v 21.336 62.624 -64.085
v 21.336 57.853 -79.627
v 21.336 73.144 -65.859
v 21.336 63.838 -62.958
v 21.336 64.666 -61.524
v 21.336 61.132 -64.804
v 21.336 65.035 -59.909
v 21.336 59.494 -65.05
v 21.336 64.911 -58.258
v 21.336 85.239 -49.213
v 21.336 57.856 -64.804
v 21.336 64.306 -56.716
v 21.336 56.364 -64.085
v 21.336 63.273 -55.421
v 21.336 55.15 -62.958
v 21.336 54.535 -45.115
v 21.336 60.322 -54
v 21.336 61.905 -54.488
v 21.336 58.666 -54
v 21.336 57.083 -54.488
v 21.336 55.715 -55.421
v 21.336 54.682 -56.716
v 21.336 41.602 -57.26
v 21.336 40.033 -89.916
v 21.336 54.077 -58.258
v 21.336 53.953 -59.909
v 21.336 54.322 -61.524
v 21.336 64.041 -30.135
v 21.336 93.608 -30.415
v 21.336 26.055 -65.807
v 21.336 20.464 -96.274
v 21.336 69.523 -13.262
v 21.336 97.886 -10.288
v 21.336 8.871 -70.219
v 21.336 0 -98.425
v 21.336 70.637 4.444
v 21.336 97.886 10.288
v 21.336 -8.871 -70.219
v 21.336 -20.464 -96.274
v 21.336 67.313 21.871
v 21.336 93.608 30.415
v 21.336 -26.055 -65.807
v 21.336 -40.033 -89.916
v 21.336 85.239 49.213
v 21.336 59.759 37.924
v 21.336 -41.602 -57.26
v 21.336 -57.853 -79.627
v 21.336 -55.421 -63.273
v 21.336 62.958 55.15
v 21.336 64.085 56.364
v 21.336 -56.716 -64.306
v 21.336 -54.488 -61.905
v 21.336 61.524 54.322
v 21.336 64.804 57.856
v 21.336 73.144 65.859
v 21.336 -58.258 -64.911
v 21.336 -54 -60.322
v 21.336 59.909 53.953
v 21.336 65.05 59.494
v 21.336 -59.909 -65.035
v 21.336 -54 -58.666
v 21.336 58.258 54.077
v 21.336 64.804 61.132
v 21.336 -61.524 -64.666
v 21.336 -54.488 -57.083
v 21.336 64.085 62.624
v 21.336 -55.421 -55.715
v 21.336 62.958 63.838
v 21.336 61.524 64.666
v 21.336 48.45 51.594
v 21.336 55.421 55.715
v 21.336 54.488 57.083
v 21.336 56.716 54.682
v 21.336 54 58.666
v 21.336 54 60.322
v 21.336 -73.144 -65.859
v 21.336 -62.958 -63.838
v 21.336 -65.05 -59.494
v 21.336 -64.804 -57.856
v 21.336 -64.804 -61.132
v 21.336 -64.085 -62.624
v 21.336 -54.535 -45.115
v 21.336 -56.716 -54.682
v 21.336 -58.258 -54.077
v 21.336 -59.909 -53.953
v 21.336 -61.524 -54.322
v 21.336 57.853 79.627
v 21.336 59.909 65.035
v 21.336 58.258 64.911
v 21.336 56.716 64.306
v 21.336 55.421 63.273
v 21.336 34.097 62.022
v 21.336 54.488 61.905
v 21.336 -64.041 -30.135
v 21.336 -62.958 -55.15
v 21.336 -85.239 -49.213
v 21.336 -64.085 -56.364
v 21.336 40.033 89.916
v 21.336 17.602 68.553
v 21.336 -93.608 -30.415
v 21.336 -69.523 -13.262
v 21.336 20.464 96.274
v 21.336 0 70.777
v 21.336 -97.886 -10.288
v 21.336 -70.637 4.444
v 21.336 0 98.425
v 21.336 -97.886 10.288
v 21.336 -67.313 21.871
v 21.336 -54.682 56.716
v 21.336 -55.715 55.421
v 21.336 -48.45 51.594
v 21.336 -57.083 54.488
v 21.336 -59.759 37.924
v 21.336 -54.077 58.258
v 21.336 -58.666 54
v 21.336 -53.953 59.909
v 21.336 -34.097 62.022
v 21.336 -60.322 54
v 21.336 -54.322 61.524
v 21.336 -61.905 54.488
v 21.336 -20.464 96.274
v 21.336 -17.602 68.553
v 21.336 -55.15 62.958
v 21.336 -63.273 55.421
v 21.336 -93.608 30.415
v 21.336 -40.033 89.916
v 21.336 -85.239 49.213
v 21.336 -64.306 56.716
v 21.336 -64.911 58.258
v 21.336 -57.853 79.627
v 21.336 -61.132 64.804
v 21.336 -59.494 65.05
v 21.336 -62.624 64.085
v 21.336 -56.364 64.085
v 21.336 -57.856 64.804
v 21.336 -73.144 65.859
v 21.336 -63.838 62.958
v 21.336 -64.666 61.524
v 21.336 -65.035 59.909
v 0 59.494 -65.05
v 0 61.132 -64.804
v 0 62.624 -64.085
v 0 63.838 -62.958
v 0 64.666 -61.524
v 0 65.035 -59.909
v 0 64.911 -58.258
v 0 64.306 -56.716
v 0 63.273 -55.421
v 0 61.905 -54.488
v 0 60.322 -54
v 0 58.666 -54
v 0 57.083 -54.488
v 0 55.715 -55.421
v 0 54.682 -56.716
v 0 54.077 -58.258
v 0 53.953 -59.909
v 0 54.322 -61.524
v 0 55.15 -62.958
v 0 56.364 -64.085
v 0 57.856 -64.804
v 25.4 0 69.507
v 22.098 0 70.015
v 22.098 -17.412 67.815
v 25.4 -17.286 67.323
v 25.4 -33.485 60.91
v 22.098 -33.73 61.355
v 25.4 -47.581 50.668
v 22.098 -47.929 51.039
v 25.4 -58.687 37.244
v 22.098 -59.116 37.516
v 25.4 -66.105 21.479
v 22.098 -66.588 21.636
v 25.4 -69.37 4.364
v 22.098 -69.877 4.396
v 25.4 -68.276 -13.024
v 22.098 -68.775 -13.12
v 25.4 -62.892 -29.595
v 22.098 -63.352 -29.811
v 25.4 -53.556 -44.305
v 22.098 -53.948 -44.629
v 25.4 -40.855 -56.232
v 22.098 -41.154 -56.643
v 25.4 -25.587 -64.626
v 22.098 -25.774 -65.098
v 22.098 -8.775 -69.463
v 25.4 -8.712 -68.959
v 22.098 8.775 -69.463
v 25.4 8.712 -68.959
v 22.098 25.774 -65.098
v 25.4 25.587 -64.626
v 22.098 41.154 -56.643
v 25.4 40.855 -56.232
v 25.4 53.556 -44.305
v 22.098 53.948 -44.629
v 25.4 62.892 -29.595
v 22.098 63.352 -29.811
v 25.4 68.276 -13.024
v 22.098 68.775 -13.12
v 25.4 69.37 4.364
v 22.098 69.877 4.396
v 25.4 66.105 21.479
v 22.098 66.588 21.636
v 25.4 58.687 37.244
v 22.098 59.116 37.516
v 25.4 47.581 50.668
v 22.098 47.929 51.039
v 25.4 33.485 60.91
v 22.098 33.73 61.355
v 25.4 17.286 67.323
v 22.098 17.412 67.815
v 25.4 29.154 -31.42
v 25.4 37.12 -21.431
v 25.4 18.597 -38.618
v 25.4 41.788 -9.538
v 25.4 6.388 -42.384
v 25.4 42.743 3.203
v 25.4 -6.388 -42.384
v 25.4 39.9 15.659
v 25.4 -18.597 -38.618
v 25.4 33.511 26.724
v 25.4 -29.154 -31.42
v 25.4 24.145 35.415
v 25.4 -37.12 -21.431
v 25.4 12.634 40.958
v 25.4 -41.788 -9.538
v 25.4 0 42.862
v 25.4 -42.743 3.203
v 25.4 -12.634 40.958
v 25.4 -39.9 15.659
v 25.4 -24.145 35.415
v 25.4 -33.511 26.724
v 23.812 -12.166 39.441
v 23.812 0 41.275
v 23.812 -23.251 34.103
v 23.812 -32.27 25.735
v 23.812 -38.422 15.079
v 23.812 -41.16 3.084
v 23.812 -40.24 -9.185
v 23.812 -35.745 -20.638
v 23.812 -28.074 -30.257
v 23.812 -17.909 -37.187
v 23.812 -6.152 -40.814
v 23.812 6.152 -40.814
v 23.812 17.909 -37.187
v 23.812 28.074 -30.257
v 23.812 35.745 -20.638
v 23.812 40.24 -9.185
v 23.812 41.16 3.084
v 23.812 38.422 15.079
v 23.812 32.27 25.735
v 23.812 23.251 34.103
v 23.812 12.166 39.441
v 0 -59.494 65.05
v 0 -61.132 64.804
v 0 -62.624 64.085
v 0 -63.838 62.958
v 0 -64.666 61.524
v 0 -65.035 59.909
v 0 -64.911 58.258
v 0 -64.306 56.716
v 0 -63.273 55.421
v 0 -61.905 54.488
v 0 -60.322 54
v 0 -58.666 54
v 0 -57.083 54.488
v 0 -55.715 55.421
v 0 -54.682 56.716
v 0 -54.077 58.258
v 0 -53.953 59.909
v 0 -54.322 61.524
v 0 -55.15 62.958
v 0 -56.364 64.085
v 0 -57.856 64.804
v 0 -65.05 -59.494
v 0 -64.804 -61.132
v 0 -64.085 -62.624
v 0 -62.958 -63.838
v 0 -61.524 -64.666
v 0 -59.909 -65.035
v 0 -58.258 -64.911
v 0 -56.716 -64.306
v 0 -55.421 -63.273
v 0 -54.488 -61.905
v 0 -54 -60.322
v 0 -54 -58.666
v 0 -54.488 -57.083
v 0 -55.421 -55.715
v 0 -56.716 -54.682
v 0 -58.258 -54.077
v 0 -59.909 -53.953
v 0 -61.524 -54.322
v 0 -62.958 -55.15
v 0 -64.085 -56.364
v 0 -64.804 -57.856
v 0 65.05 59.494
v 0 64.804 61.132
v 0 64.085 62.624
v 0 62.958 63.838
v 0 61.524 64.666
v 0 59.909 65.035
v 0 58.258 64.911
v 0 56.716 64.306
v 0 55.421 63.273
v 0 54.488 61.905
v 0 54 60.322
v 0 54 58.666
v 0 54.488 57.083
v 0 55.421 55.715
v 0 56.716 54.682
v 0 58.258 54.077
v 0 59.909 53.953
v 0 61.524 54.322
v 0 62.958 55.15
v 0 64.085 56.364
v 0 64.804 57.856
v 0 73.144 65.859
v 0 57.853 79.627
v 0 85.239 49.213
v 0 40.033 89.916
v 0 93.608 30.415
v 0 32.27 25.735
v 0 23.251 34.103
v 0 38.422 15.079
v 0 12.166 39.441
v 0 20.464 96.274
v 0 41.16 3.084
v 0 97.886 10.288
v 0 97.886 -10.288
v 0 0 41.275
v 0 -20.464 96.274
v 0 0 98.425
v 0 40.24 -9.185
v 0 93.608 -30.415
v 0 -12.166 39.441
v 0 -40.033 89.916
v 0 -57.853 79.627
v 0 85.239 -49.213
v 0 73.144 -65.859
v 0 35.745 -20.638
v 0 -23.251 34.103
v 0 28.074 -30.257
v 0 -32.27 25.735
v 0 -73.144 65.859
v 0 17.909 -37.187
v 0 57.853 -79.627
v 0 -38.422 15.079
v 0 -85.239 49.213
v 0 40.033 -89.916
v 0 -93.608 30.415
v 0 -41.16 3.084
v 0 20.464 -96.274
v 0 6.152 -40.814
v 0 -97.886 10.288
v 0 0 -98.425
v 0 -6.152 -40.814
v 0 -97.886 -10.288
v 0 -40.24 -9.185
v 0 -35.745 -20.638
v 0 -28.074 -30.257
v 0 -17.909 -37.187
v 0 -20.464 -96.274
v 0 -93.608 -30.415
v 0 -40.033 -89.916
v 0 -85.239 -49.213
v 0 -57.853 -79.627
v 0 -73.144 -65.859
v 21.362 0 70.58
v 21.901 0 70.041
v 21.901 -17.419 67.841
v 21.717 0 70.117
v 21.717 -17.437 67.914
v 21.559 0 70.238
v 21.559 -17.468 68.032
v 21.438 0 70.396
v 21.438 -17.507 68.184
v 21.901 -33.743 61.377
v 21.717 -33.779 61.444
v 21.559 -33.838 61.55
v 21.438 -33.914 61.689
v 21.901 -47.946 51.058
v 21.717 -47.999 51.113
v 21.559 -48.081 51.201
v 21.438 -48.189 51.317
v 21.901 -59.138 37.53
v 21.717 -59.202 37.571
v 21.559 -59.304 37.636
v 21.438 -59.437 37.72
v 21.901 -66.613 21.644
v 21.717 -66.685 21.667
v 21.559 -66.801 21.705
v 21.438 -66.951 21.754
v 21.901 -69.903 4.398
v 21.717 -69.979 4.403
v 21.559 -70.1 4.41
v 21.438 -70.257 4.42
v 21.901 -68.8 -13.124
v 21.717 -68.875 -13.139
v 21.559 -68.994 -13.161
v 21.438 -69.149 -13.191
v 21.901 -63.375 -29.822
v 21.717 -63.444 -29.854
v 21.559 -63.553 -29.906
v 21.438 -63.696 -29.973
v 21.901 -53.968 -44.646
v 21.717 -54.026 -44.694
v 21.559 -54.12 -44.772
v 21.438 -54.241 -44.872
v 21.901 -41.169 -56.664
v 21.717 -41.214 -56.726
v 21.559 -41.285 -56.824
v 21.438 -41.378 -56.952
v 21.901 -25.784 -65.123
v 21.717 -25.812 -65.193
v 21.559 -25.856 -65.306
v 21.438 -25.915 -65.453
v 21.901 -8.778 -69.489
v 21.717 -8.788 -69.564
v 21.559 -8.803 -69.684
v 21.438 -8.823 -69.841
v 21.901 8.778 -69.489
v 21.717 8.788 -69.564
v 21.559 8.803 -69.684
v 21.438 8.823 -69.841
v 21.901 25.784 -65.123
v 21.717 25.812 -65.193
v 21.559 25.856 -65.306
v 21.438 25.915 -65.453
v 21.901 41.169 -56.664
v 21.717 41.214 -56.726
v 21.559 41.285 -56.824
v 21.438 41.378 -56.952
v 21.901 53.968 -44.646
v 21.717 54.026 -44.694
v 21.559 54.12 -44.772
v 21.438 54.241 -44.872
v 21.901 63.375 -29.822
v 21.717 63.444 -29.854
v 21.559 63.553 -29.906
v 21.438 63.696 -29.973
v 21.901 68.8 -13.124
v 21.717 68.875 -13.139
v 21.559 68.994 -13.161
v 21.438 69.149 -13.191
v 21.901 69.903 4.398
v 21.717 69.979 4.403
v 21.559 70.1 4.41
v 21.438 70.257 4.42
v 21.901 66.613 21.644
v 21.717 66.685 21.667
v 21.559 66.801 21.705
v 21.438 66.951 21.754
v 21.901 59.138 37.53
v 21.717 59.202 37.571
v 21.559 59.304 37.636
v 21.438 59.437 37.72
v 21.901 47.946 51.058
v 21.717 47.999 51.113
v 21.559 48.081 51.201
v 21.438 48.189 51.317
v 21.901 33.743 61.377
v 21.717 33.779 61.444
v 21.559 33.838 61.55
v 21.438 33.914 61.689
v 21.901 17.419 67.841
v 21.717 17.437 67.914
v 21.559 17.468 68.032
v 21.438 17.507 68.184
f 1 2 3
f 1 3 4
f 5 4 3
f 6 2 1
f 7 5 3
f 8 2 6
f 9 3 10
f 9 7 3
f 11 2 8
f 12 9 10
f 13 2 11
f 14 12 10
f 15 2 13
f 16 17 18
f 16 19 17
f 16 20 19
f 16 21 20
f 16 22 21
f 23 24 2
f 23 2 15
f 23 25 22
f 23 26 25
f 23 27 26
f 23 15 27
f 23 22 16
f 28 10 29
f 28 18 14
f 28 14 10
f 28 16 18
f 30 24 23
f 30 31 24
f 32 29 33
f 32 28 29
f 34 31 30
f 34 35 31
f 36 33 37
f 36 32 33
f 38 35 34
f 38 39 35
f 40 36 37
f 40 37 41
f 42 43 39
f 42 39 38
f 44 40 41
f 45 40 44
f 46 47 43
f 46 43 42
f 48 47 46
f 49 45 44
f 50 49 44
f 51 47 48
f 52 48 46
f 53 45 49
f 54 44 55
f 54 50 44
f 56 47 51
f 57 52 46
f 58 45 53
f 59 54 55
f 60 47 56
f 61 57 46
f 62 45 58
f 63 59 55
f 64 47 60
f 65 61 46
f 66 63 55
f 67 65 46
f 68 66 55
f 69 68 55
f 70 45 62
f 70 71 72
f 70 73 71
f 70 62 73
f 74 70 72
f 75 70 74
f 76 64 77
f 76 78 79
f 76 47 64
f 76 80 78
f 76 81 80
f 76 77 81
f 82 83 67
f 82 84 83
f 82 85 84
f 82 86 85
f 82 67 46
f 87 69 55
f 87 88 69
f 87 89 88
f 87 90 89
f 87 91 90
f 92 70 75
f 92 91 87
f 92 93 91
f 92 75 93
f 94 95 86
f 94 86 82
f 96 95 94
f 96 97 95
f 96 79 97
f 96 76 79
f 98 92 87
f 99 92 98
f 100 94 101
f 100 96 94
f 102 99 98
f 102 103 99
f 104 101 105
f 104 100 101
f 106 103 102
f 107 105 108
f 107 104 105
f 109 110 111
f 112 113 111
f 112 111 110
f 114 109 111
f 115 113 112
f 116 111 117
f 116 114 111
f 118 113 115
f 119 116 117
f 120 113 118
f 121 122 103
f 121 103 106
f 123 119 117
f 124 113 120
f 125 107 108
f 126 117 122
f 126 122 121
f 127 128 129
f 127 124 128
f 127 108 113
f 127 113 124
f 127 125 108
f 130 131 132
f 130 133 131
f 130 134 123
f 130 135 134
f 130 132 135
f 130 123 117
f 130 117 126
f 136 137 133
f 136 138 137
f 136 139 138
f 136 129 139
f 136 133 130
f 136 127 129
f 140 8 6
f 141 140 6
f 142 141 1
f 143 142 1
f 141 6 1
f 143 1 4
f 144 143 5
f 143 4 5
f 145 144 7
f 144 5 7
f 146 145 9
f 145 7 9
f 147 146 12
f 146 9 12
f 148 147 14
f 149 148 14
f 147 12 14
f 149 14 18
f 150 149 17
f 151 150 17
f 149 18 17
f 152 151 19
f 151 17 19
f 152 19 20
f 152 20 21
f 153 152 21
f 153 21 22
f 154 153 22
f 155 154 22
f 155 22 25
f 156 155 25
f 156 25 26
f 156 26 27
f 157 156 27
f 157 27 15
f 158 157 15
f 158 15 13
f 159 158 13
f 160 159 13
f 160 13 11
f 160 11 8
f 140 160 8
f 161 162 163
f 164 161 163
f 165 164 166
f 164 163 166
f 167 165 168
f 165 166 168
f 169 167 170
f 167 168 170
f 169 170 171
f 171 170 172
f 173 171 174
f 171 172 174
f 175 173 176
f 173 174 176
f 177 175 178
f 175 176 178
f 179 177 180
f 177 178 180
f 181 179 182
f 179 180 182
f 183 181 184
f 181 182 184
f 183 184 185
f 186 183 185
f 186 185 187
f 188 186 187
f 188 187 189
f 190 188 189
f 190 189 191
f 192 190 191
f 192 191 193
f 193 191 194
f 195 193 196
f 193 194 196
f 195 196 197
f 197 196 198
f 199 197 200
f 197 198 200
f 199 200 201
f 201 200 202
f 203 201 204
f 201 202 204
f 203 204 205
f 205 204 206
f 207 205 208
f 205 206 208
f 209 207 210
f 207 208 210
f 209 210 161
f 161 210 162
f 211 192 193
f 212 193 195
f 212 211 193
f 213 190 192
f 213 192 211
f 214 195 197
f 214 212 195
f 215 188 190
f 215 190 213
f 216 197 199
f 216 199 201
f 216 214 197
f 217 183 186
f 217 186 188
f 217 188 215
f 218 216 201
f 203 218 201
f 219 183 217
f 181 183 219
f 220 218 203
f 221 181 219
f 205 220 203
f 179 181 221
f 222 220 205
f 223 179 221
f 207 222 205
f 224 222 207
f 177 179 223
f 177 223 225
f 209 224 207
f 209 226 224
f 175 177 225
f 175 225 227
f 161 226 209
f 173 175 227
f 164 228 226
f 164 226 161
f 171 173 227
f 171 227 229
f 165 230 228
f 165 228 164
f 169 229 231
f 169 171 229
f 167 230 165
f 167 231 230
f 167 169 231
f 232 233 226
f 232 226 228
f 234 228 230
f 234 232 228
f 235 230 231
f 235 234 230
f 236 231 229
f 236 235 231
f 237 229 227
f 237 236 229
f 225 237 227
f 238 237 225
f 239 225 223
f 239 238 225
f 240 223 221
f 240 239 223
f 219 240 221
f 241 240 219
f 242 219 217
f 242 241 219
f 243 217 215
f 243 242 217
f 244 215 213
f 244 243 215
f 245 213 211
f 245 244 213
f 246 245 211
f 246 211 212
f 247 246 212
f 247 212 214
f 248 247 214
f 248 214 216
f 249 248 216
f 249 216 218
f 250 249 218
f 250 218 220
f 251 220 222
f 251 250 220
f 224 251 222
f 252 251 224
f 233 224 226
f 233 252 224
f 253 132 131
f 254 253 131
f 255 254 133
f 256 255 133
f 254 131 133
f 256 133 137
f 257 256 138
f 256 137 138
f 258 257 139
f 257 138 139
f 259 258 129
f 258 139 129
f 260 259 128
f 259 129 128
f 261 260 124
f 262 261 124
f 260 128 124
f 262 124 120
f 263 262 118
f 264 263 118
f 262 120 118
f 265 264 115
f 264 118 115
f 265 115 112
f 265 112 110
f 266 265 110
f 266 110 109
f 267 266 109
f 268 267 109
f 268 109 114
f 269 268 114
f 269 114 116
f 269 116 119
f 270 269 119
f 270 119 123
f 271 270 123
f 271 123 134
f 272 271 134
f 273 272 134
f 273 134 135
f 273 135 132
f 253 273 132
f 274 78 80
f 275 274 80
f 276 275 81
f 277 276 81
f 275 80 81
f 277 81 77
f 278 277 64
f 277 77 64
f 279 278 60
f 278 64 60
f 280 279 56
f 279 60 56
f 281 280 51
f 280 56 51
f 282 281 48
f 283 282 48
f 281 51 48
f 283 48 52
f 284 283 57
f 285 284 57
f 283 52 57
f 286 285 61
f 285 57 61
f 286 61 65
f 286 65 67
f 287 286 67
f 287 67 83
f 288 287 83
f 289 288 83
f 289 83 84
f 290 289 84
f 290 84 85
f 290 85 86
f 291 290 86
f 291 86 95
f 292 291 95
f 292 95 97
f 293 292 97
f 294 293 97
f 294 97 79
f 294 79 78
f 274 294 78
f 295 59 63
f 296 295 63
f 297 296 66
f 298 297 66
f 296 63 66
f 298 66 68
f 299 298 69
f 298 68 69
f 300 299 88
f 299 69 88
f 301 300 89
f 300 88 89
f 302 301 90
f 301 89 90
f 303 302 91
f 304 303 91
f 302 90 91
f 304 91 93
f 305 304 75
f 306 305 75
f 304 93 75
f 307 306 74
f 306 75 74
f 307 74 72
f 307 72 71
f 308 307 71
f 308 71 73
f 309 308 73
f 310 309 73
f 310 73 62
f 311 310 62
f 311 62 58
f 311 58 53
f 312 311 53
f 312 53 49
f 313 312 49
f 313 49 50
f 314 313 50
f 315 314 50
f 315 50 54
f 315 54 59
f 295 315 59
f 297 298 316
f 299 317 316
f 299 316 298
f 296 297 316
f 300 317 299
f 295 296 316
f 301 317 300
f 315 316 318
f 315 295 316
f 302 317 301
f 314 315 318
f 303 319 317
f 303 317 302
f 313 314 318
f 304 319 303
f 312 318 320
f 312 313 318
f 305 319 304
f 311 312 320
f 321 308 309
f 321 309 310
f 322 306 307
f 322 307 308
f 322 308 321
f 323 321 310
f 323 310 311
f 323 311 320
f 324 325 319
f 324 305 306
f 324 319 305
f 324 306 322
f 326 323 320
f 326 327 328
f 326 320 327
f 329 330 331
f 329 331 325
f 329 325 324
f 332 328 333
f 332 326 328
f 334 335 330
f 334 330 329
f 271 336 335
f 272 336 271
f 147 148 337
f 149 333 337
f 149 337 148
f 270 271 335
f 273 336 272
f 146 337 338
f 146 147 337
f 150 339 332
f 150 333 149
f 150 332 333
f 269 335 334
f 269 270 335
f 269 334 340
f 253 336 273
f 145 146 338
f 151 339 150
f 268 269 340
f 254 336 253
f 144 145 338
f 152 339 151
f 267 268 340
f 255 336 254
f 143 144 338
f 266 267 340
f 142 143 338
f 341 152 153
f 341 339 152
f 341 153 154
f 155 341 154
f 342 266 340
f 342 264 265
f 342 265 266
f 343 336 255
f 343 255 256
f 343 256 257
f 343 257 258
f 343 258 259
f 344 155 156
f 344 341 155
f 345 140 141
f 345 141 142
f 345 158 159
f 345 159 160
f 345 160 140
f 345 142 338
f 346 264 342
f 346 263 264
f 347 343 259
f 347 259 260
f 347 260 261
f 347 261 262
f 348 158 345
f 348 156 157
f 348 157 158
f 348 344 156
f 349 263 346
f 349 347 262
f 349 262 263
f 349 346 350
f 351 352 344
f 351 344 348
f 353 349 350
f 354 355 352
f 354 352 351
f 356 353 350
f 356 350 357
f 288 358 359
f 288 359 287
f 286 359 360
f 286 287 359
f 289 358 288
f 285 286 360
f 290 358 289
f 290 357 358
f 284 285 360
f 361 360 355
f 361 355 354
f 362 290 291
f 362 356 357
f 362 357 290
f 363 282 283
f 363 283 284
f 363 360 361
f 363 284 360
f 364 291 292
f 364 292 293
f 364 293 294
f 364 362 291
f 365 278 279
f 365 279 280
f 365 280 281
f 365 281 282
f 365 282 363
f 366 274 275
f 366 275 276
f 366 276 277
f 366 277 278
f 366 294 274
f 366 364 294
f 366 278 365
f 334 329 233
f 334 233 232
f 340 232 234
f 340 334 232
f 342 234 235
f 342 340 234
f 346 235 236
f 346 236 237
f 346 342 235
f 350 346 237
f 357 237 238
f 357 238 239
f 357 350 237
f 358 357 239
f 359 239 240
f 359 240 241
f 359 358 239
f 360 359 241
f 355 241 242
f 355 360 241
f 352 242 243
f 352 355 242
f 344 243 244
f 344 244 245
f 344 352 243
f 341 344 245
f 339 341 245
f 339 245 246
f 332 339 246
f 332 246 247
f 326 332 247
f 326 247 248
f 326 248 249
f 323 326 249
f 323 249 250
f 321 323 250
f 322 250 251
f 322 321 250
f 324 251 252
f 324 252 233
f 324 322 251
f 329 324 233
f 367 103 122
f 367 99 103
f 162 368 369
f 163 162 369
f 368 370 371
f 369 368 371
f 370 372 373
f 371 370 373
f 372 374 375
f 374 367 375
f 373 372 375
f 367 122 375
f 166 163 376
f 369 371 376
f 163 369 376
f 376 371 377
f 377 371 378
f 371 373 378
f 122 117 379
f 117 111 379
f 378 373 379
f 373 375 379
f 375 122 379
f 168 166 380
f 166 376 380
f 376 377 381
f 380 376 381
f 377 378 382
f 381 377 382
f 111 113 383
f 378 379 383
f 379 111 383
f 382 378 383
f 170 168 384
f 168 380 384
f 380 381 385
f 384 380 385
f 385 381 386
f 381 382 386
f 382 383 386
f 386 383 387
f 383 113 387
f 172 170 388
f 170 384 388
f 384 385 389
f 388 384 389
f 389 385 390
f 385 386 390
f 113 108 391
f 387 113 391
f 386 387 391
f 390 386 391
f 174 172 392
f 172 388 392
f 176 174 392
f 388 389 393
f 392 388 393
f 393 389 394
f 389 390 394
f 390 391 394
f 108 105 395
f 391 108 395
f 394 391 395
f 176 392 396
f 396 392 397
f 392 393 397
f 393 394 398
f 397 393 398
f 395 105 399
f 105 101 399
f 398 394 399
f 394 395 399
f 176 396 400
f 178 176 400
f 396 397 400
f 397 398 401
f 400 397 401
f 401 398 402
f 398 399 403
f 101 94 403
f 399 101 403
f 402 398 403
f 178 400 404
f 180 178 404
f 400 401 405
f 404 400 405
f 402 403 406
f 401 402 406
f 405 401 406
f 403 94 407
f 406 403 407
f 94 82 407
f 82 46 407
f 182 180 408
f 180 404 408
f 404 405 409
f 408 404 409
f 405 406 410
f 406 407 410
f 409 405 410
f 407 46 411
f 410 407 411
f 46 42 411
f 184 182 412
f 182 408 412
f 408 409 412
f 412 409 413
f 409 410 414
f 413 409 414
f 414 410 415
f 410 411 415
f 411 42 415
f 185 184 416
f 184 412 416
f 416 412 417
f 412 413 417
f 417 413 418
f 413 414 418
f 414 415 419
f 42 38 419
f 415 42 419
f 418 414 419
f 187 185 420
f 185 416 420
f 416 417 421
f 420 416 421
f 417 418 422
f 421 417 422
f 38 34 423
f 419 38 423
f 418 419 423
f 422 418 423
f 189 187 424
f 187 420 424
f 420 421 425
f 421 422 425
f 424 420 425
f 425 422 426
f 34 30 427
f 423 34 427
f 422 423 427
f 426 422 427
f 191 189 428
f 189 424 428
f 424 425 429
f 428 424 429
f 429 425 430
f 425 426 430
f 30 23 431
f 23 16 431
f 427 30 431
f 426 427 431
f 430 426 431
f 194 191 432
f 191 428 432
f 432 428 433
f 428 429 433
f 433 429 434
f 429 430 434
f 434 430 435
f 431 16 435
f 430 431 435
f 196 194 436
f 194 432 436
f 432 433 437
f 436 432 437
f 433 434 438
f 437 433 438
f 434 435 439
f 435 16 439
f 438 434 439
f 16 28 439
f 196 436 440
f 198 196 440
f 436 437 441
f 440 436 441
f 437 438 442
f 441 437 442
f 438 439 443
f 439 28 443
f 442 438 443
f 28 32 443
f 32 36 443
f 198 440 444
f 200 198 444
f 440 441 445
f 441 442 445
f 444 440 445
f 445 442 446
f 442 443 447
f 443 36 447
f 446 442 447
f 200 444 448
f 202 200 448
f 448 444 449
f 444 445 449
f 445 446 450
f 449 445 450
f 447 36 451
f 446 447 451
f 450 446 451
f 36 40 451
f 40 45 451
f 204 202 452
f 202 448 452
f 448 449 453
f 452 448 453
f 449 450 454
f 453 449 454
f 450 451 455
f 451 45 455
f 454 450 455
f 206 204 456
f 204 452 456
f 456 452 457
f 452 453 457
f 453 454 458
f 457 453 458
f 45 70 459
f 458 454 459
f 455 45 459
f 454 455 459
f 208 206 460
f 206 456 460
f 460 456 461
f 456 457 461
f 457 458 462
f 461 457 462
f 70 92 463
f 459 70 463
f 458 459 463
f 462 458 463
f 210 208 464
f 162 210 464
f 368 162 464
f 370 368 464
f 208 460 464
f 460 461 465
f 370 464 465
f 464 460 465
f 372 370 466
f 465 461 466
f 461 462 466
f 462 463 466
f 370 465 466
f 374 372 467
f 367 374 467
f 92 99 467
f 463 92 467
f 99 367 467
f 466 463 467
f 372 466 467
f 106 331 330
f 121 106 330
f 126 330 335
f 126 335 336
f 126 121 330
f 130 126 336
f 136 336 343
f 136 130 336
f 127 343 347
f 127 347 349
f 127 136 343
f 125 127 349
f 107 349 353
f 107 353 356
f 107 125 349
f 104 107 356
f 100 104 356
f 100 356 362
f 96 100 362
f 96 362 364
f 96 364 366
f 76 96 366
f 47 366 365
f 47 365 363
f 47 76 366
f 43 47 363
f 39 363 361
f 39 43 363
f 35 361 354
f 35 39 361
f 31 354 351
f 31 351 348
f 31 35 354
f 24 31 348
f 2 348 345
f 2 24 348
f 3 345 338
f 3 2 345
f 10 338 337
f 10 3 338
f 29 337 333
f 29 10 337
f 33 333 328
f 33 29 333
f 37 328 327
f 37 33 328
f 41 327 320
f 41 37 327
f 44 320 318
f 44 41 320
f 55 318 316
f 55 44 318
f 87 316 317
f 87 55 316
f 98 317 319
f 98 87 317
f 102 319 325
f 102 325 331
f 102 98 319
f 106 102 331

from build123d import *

# Parameters (mm, degrees)
SKETCH2_R          = 5.55625
CUT_EXTRUDE1_DEPTH = 141.819693743
CIRPATTERN1_COUNT  = 4
CHAMFER1_SIZE      = 0.508
CHAMFER1_SIZE2     = 3.302
CHAMFER2_SIZE      = 1.5875
FILLET1_R          = 0.762


with BuildPart() as part:
    # Sketch1 → Revolve1 (revolve)
    with BuildSketch(Plane.XY, mode=Mode.PRIVATE) as revolve1_sk:
        Polygon((0, 41.275), (0, 98.425), (21.336, 98.425), (21.336, 70.0151), (25.4, 70.0151), (25.4, 41.275), align=None)
    revolve(revolve1_sk.sketch.rotate(Axis((0, 0, 0), (1, 0, 0)), 90), axis=Axis((0, 0, 0), (1, 0, 0)))

    # Sketch2 → Cut-Extrude1 (cut, through all)
    with BuildSketch(Plane(origin=(21.336, 0, 0), x_dir=(0, 0, -1), z_dir=(1, 0, 0))):
        with Locations((59.494196802, 59.494196802)):
            Circle(SKETCH2_R)
    cut_extrude1 = extrude(amount=-CUT_EXTRUDE1_DEPTH, mode=Mode.SUBTRACT)

    # CirPattern1: Cut-Extrude1 ×4 about axis
    cirpattern1_axis = Axis((0, 0, 0), (1, 0, 0))
    for i in range(1, CIRPATTERN1_COUNT):
        add(cut_extrude1.rotate(cirpattern1_axis, i * 360 / CIRPATTERN1_COUNT), mode=Mode.SUBTRACT)

    # Chamfer1
    chamfer1_edges = [part.edges().sort_by_distance(p)[0] for p in [
        (25.4, 0, -70.0151),
    ]]
    chamfer1_side = [part.faces().sort_by_distance(p)[0] for p in [
        (25.4, 0, -68.03477392),
    ]]
    chamfer(chamfer1_edges, length=CHAMFER1_SIZE, length2=CHAMFER1_SIZE2, reference=chamfer1_side[0])

    # Chamfer2
    chamfer2_edges = [part.edges().sort_by_distance(p)[0] for p in [
        (25.4, 0, -41.275),
    ]]
    chamfer(chamfer2_edges, length=CHAMFER2_SIZE)

    # Fillet1
    fillet1_edges = [part.edges().sort_by_distance(p)[0] for p in [
        (21.336, 0, -70.0151),
    ]]
    fillet(fillet1_edges, radius=FILLET1_R - 0.0001)  # a hair under: the kernel refuses the full size


solid = part.part
